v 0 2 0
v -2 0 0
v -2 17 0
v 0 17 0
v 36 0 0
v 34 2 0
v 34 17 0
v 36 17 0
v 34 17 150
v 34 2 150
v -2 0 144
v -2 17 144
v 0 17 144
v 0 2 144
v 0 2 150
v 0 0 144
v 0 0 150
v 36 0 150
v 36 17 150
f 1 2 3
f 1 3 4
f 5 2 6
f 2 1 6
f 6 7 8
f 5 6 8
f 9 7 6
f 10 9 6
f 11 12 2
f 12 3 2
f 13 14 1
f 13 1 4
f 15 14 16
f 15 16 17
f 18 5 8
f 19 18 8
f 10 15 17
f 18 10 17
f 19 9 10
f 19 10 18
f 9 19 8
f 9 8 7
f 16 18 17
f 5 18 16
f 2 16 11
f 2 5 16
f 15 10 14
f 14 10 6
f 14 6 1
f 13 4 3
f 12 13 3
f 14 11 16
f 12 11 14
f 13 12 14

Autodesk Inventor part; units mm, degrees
ref_plane "YZ Plane" through (0, 0, 0) normal (1, 0, 0) x (0, 1, 0)
ref_plane "XZ Plane" through (0, 0, 0) normal (0, 1, 0) x (-1, 0, 0)
ref_plane "XY Plane" through (0, 0, 0) normal (0, 0, 1) x (1, 0, 0)
sketch "Sketch1" plane through (0, 0, 0) normal (0, 0, 1) x (1, 0, 0)
  line L0 (0, 0) -> (-2, 0)
  line L1 (-2, 0) -> (36, 0)
  line L2 (36, 0) -> (36, 17)
  line L3 (36, 17) -> (34, 17)
  line L4 (34, 17) -> (34, 2)
  line L5 (34, 2) -> (0, 2)
  line L6 (0, 2) -> (0, 17)
  line L7 (0, 17) -> (-2, 17)
  line L8 (-2, 17) -> (-2, 0)
  dimension "d8" = 2
  dimension "d9" = 38
  dimension "d10" = 17
  dimension "d11" = 2
  dimension "d12" = 15
extrude "Extrusion1" add sketch "Sketch1" along normal blind 150
sketch "Sketch2" plane through (-2, 17, 150) normal (0, 1, 0) x (1, 0, 0)
  line L0 (0, 150) -> (0, 0) projected
  line L1 (0, 0) -> (0, 6)
  line L2 (0, 6) -> (2, 6)
  line L3 (2, 150) -> (2, 0) projected
  line L4 (2, 6) -> (2, 0)
  line L5 (2, 0) -> (0, 0)
  dimension "d13" = 6
  dimension "d14" = 2
extrude "Extrusion2" cut sketch "Sketch2" against normal through all
properties part number "slide1"
